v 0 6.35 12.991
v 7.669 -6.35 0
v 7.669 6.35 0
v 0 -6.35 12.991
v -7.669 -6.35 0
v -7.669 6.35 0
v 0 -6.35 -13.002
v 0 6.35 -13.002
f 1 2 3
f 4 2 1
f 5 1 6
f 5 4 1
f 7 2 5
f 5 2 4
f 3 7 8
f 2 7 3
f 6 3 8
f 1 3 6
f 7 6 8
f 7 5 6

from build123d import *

# Parameters (mm, degrees)
F1_DEPTH = 5.08
F2_DEPTH = 5.08
F3_W     = 124.8834840953
F3_H     = 134.0803280473
F4_DEPTH = 25.4
F5_DEPTH = 1.27
F6_DEPTH = 1.27


with BuildPart() as f1:
    # F0 (on Front) → F1 (new body)
    with BuildSketch(Plane.XZ):
        with BuildLine():
            add(Edge.make_bspline(
                [(11.6870266183, 8.3659507286), (11.9476031572, 8.1243832132), (12.5616108346, 7.4348870399), (13.3502602627, 5.9055860485), (12.8304196463, 2.6136928469), (12.1032885822, -3.9726756525), (11.7671016032, -8.6546761386), (11.3077259518, -11.7183290107), (11.0820746049, -13.2232354954)],
                knots=[0.7644347581, 0.7644347581, 0.7644347581, 0.7644347581, 0.7813803339, 0.8102561854, 0.8494051355, 0.9057589485, 0.9537075591, 1, 1, 1, 1], degree=3))
            Line((11.6870266183, 8.3659507286), (10.7098612934, -7.1798651479))
            Line((10.7098612934, -7.1798651479), (-10.6029463932, 18.994666636))
            Line((-10.6029463932, 18.994666636), (-7.8187826003, 81.9431145827))
            add(Edge.make_bspline(
                [(-10.6029463932, 84.9773436785), (-9.8645957866, 84.411917966), (-8.8470388386, 83.6326772405), (-8.0272766718, 82.3316307612), (-7.8187826003, 81.9431145827)],
                knots=[0, 0, 0, 0, 0.0369842854, 0.0509698458, 0.0509698458, 0.0509698458, 0.0509698458], degree=3))
            add(Edge.make_bspline(
                [(-11.1952358857, -13.2855195552), (-11.1963398761, -12.8902117283), (-11.1997561984, -11.6669231231), (-11.1512885463, -5.3731858959), (-11.3422819981, 1.4393792063), (-12.1461643066, 4.6189611976), (-13.2850553088, 9.1238655935), (-15.2318124981, 13.6348809881), (-16.5294824008, 17.2010053959), (-19.3261405399, 23.6368379744), (-19.7379489625, 26.452730971), (-18.8574929103, 31.5305578619), (-16.6797816611, 35.2468825016), (-14.5909185063, 40.6408371255), (-13.4119591393, 46.1621954132), (-12.5394588361, 53.3896491248), (-12.0546254183, 59.9791874234), (-12.4642284532, 65.9827168693), (-12.3457592591, 73.9226808987), (-11.3164428193, 80.5227149139), (-11.5649092387, 84.7450814286), (-10.8268692537, 84.9232783602), (-10.6029463932, 84.9773436785)],
                knots=[0, 0, 0, 0, 0.0273896804, 0.0847579572, 0.1451631407, 0.1862204743, 0.2349457062, 0.2850522094, 0.3309978555, 0.390291, 0.4296935499, 0.4796750401, 0.527816225, 0.5818528524, 0.6365092781, 0.6980539867, 0.7565756752, 0.8124783975, 0.8767822708, 0.9378286387, 0.9811370802, 1, 1, 1, 1], degree=3))
            Line((-11.1952358857, -13.2855195552), (10.8409429303, -13.2855195552))
            add(Edge.make_bspline(
                [(10.8409429303, -13.2855195552), (10.9216527758, -13.2575733481), (11.0020770139, -13.2366740148), (11.0820746049, -13.2232354954)],
                knots=[0.9988692567, 0.9988692567, 0.9988692567, 0.9988692567, 1, 1, 1, 1], degree=3))
        make_face()
        with BuildLine():
            Line((10.7098612934, -7.1798651479), (11.6870266183, 8.3659507286))
            add(Edge.make_bspline(
                [(-7.8187826003, 81.9431145827), (-7.3326835412, 81.037298185), (-6.246332701, 78.0877738667), (-5.7619281696, 71.7972152113), (-5.7903461619, 61.0472196354), (-5.6098025476, 47.5528084715), (-5.6232359348, 35.7951775922), (-6.6035814728, 31.5572406566), (-6.642373723, 26.8588973108), (-4.7217209893, 21.7576733197), (-2.3324429206, 17.8568763905), (-0.0644904347, 14.9988475653), (2.1698029367, 12.9502128359), (5.7523840475, 11.2499433455), (8.6363164493, 10.2542124123), (10.6765655712, 9.2073747067), (11.4911211984, 8.5475648745), (11.6870266183, 8.3659507286)],
                knots=[0.0509698458, 0.0509698458, 0.0509698458, 0.0509698458, 0.0835768534, 0.1402547932, 0.2115954168, 0.293701069, 0.3674969806, 0.4121442254, 0.4580916534, 0.50894046, 0.5557476766, 0.5967458601, 0.6345135251, 0.6775157549, 0.7161326985, 0.7516948155, 0.7644347581, 0.7644347581, 0.7644347581, 0.7644347581], degree=3))
            Line((-7.8187826003, 81.9431145827), (-10.6029463932, 18.994666636))
            Line((-10.6029463932, 18.994666636), (10.7098612934, -7.1798651479))
        make_face()
        with BuildLine():
            Line((11.0820746049, -15.9663576633), (11.0820746049, -13.2855195552))
            Line((11.0820746049, -13.2855195552), (10.8409429303, -13.2855195552))
            add(Edge.make_bspline(
                [(8.3953980002, -15.9663576633), (9.1364610409, -14.6227373643), (10.004055933, -13.5752960653), (10.8409429303, -13.2855195552)],
                knots=[0.9871444865, 0.9871444865, 0.9871444865, 0.9871444865, 0.9988692567, 0.9988692567, 0.9988692567, 0.9988692567], degree=3))
            Line((8.3953980003, -15.9663576633), (11.0820746049, -15.9663576633))
        make_face()
        with BuildLine():
            add(Edge.make_bspline(
                [(8.3953980002, -15.9663576633), (9.1364610409, -14.6227373643), (10.004055933, -13.5752960653), (10.8409429303, -13.2855195552)],
                knots=[0.9871444865, 0.9871444865, 0.9871444865, 0.9871444865, 0.9988692567, 0.9988692567, 0.9988692567, 0.9988692567], degree=3))
            Line((10.8409429303, -13.2855195552), (-11.1952358857, -13.2855195552))
            Line((-11.1952358857, -13.2855195552), (-11.0308257863, -15.9663576633))
            Line((-11.0308257863, -15.9663576633), (8.3953980003, -15.9663576633))
        make_face()
        with BuildLine():
            Line((11.0820746049, -13.2855195552), (11.0820746049, -13.2232354954))
            add(Edge.make_bspline(
                [(10.8409429303, -13.2855195552), (10.9216527758, -13.2575733481), (11.0020770139, -13.2366740148), (11.0820746049, -13.2232354954)],
                knots=[0.9988692567, 0.9988692567, 0.9988692567, 0.9988692567, 1, 1, 1, 1], degree=3))
            Line((10.8409429303, -13.2855195552), (11.0820746049, -13.2855195552))
        make_face()
    extrude(amount=F1_DEPTH)

    # F2 (add): a face of the model
    f2_faces = [f1.faces().sort_by_distance(p)[0] for p in [
        (-5.0809274024, 0, 19.1888153538),
    ]]
    extrude(f2_faces, amount=F2_DEPTH)

    # F3 (on face) → F4 (cut)
    with BuildSketch(Plane.XZ.offset(5.08)):
        with Locations((7.2313416749, 30.1963053644)):
            Rectangle(F3_W, F3_H)
        with BuildLine():
            Line((-11.0308257863, -15.9663576633), (-11.1952358857, -13.2855195552))
            add(Edge.make_bspline(
                [(-11.1952358857, -13.2855195552), (-11.1963398761, -12.8902117283), (-11.1997561984, -11.6669231231), (-11.1512885463, -5.3731858959), (-11.3422819981, 1.4393792063), (-12.1461643066, 4.6189611976), (-13.2850553088, 9.1238655935), (-15.2318124981, 13.6348809881), (-16.5294824008, 17.2010053959), (-19.3261405399, 23.6368379744), (-19.7379489625, 26.452730971), (-18.8574929103, 31.5305578619), (-16.6797816611, 35.2468825016), (-14.5909185063, 40.6408371255), (-13.4119591393, 46.1621954132), (-12.5394588361, 53.3896491248), (-12.0546254183, 59.9791874234), (-12.4642284532, 65.9827168693), (-12.3457592591, 73.9226808987), (-11.3164428193, 80.5227149139), (-11.5649092387, 84.7450814286), (-10.8268692537, 84.9232783602), (-10.6029463932, 84.9773436785)],
                knots=[0, 0, 0, 0, 0.0273896804, 0.0847579572, 0.1451631407, 0.1862204743, 0.2349457062, 0.2850522094, 0.3309978555, 0.390291, 0.4296935499, 0.4796750401, 0.527816225, 0.5818528524, 0.6365092781, 0.6980539867, 0.7565756752, 0.8124783975, 0.8767822708, 0.9378286387, 0.9811370802, 1, 1, 1, 1], degree=3))
            add(Edge.make_bspline(
                [(11.0820746049, -13.2232354954), (11.3077259518, -11.7183290107), (11.7671016032, -8.6546761386), (12.1032885822, -3.9726756525), (12.8304196463, 2.6136928469), (13.3502602627, 5.9055860485), (12.443365527, 7.6641811468), (11.0743289472, 9.0032850711), (8.6363164493, 10.2542124123), (5.7523840475, 11.2499433455), (2.1698029367, 12.9502128359), (-0.0644904347, 14.9988475653), (-2.3324429206, 17.8568763905), (-4.7217209893, 21.7576733197), (-6.642373723, 26.8588973108), (-6.6035814728, 31.5572406566), (-5.6232359348, 35.7951775922), (-5.6098025476, 47.5528084715), (-5.7903461619, 61.0472196354), (-5.7619281696, 71.7972152113), (-6.2885094778, 78.6354885776), (-8.1960757736, 83.1341725308), (-9.8645957866, 84.411917966), (-10.6029463932, 84.9773436785)],
                knots=[0.7644347581, 0.7644347581, 0.7644347581, 0.7644347581, 0.810727199, 0.8586758096, 0.9150296226, 0.9541785727, 0.9830544242, 1.0127399426, 1.0483020596, 1.0869190032, 1.1299212329, 1.167688898, 1.2086870814, 1.2554942981, 1.3063431047, 1.3522905327, 1.3969377775, 1.470733689, 1.5528393413, 1.6241799649, 1.6808579047, 1.7274504726, 1.7644347581, 1.7644347581, 1.7644347581, 1.7644347581], degree=3))
            Line((11.0820746049, -13.2232354954), (11.0820746049, -15.9663576633))
            Line((11.0820746049, -15.9663576633), (-11.0308257863, -15.9663576633))
        make_face(mode=Mode.SUBTRACT)
        with BuildLine():
            add(Edge.make_bspline(
                [(-11.1952358857, -13.2855195552), (-11.1963398761, -12.8902117283), (-11.1997561984, -11.6669231231), (-11.1512885463, -5.3731858959), (-11.3422819981, 1.4393792063), (-12.1461643066, 4.6189611976), (-13.2850553088, 9.1238655935), (-15.2318124981, 13.6348809881), (-16.5294824008, 17.2010053959), (-19.3261405399, 23.6368379744), (-19.7379489625, 26.452730971), (-18.8574929103, 31.5305578619), (-16.6797816611, 35.2468825016), (-14.5909185063, 40.6408371255), (-13.4119591393, 46.1621954132), (-12.5394588361, 53.3896491248), (-12.0546254183, 59.9791874234), (-12.4642284532, 65.9827168693), (-12.3457592591, 73.9226808987), (-11.3164428193, 80.5227149139), (-11.5649092387, 84.7450814286), (-10.8268692537, 84.9232783602), (-10.6029463932, 84.9773436785)],
                knots=[0, 0, 0, 0, 0.0273896804, 0.0847579572, 0.1451631407, 0.1862204743, 0.2349457062, 0.2850522094, 0.3309978555, 0.390291, 0.4296935499, 0.4796750401, 0.527816225, 0.5818528524, 0.6365092781, 0.6980539867, 0.7565756752, 0.8124783975, 0.8767822708, 0.9378286387, 0.9811370802, 1, 1, 1, 1], degree=3))
            Line((-11.1952358857, -13.2855195552), (-11.0308257863, -15.9663576633))
            Line((-11.0308257863, -15.9663576633), (11.0820746049, -15.9663576633))
            Line((11.0820746049, -15.9663576633), (11.0820746049, -13.2232354954))
            add(Edge.make_bspline(
                [(11.0820746049, -13.2232354954), (11.3077259518, -11.7183290107), (11.7671016032, -8.6546761386), (12.1032885822, -3.9726756525), (12.8304196463, 2.6136928469), (13.3502602627, 5.9055860485), (12.443365527, 7.6641811468), (11.0743289472, 9.0032850711), (8.6363164493, 10.2542124123), (5.7523840475, 11.2499433455), (2.1698029367, 12.9502128359), (-0.0644904347, 14.9988475653), (-2.3324429206, 17.8568763905), (-4.7217209893, 21.7576733197), (-6.642373723, 26.8588973108), (-6.6035814728, 31.5572406566), (-5.6232359348, 35.7951775922), (-5.6098025476, 47.5528084715), (-5.7903461619, 61.0472196354), (-5.7619281696, 71.7972152113), (-6.2885094778, 78.6354885776), (-8.1960757736, 83.1341725308), (-9.8645957866, 84.411917966), (-10.6029463932, 84.9773436785)],
                knots=[0.7644347581, 0.7644347581, 0.7644347581, 0.7644347581, 0.810727199, 0.8586758096, 0.9150296226, 0.9541785727, 0.9830544242, 1.0127399426, 1.0483020596, 1.0869190032, 1.1299212329, 1.167688898, 1.2086870814, 1.2554942981, 1.3063431047, 1.3522905327, 1.3969377775, 1.470733689, 1.5528393413, 1.6241799649, 1.6808579047, 1.7274504726, 1.7644347581, 1.7644347581, 1.7644347581, 1.7644347581], degree=3))
        make_face()
        Polygon((-7.6687936671, 0), (0, 12.9914516583), (7.6687936671, 0), (0, -13.0022913218), align=None, mode=Mode.SUBTRACT)
    extrude(amount=-F4_DEPTH, mode=Mode.SUBTRACT)

    # F5 (add): a face of the model
    f5_faces = [f1.faces().sort_by_distance(p)[0] for p in [
        (0, -5.08, -0.0036132211),
    ]]
    extrude(f5_faces, amount=F5_DEPTH)

    # F6 (add): a face of the model
    f6_faces = [f1.faces().sort_by_distance(p)[0] for p in [
        (0, 5.08, -0.0036132211),
    ]]
    extrude(f6_faces, amount=F6_DEPTH)


solid = f1.part
